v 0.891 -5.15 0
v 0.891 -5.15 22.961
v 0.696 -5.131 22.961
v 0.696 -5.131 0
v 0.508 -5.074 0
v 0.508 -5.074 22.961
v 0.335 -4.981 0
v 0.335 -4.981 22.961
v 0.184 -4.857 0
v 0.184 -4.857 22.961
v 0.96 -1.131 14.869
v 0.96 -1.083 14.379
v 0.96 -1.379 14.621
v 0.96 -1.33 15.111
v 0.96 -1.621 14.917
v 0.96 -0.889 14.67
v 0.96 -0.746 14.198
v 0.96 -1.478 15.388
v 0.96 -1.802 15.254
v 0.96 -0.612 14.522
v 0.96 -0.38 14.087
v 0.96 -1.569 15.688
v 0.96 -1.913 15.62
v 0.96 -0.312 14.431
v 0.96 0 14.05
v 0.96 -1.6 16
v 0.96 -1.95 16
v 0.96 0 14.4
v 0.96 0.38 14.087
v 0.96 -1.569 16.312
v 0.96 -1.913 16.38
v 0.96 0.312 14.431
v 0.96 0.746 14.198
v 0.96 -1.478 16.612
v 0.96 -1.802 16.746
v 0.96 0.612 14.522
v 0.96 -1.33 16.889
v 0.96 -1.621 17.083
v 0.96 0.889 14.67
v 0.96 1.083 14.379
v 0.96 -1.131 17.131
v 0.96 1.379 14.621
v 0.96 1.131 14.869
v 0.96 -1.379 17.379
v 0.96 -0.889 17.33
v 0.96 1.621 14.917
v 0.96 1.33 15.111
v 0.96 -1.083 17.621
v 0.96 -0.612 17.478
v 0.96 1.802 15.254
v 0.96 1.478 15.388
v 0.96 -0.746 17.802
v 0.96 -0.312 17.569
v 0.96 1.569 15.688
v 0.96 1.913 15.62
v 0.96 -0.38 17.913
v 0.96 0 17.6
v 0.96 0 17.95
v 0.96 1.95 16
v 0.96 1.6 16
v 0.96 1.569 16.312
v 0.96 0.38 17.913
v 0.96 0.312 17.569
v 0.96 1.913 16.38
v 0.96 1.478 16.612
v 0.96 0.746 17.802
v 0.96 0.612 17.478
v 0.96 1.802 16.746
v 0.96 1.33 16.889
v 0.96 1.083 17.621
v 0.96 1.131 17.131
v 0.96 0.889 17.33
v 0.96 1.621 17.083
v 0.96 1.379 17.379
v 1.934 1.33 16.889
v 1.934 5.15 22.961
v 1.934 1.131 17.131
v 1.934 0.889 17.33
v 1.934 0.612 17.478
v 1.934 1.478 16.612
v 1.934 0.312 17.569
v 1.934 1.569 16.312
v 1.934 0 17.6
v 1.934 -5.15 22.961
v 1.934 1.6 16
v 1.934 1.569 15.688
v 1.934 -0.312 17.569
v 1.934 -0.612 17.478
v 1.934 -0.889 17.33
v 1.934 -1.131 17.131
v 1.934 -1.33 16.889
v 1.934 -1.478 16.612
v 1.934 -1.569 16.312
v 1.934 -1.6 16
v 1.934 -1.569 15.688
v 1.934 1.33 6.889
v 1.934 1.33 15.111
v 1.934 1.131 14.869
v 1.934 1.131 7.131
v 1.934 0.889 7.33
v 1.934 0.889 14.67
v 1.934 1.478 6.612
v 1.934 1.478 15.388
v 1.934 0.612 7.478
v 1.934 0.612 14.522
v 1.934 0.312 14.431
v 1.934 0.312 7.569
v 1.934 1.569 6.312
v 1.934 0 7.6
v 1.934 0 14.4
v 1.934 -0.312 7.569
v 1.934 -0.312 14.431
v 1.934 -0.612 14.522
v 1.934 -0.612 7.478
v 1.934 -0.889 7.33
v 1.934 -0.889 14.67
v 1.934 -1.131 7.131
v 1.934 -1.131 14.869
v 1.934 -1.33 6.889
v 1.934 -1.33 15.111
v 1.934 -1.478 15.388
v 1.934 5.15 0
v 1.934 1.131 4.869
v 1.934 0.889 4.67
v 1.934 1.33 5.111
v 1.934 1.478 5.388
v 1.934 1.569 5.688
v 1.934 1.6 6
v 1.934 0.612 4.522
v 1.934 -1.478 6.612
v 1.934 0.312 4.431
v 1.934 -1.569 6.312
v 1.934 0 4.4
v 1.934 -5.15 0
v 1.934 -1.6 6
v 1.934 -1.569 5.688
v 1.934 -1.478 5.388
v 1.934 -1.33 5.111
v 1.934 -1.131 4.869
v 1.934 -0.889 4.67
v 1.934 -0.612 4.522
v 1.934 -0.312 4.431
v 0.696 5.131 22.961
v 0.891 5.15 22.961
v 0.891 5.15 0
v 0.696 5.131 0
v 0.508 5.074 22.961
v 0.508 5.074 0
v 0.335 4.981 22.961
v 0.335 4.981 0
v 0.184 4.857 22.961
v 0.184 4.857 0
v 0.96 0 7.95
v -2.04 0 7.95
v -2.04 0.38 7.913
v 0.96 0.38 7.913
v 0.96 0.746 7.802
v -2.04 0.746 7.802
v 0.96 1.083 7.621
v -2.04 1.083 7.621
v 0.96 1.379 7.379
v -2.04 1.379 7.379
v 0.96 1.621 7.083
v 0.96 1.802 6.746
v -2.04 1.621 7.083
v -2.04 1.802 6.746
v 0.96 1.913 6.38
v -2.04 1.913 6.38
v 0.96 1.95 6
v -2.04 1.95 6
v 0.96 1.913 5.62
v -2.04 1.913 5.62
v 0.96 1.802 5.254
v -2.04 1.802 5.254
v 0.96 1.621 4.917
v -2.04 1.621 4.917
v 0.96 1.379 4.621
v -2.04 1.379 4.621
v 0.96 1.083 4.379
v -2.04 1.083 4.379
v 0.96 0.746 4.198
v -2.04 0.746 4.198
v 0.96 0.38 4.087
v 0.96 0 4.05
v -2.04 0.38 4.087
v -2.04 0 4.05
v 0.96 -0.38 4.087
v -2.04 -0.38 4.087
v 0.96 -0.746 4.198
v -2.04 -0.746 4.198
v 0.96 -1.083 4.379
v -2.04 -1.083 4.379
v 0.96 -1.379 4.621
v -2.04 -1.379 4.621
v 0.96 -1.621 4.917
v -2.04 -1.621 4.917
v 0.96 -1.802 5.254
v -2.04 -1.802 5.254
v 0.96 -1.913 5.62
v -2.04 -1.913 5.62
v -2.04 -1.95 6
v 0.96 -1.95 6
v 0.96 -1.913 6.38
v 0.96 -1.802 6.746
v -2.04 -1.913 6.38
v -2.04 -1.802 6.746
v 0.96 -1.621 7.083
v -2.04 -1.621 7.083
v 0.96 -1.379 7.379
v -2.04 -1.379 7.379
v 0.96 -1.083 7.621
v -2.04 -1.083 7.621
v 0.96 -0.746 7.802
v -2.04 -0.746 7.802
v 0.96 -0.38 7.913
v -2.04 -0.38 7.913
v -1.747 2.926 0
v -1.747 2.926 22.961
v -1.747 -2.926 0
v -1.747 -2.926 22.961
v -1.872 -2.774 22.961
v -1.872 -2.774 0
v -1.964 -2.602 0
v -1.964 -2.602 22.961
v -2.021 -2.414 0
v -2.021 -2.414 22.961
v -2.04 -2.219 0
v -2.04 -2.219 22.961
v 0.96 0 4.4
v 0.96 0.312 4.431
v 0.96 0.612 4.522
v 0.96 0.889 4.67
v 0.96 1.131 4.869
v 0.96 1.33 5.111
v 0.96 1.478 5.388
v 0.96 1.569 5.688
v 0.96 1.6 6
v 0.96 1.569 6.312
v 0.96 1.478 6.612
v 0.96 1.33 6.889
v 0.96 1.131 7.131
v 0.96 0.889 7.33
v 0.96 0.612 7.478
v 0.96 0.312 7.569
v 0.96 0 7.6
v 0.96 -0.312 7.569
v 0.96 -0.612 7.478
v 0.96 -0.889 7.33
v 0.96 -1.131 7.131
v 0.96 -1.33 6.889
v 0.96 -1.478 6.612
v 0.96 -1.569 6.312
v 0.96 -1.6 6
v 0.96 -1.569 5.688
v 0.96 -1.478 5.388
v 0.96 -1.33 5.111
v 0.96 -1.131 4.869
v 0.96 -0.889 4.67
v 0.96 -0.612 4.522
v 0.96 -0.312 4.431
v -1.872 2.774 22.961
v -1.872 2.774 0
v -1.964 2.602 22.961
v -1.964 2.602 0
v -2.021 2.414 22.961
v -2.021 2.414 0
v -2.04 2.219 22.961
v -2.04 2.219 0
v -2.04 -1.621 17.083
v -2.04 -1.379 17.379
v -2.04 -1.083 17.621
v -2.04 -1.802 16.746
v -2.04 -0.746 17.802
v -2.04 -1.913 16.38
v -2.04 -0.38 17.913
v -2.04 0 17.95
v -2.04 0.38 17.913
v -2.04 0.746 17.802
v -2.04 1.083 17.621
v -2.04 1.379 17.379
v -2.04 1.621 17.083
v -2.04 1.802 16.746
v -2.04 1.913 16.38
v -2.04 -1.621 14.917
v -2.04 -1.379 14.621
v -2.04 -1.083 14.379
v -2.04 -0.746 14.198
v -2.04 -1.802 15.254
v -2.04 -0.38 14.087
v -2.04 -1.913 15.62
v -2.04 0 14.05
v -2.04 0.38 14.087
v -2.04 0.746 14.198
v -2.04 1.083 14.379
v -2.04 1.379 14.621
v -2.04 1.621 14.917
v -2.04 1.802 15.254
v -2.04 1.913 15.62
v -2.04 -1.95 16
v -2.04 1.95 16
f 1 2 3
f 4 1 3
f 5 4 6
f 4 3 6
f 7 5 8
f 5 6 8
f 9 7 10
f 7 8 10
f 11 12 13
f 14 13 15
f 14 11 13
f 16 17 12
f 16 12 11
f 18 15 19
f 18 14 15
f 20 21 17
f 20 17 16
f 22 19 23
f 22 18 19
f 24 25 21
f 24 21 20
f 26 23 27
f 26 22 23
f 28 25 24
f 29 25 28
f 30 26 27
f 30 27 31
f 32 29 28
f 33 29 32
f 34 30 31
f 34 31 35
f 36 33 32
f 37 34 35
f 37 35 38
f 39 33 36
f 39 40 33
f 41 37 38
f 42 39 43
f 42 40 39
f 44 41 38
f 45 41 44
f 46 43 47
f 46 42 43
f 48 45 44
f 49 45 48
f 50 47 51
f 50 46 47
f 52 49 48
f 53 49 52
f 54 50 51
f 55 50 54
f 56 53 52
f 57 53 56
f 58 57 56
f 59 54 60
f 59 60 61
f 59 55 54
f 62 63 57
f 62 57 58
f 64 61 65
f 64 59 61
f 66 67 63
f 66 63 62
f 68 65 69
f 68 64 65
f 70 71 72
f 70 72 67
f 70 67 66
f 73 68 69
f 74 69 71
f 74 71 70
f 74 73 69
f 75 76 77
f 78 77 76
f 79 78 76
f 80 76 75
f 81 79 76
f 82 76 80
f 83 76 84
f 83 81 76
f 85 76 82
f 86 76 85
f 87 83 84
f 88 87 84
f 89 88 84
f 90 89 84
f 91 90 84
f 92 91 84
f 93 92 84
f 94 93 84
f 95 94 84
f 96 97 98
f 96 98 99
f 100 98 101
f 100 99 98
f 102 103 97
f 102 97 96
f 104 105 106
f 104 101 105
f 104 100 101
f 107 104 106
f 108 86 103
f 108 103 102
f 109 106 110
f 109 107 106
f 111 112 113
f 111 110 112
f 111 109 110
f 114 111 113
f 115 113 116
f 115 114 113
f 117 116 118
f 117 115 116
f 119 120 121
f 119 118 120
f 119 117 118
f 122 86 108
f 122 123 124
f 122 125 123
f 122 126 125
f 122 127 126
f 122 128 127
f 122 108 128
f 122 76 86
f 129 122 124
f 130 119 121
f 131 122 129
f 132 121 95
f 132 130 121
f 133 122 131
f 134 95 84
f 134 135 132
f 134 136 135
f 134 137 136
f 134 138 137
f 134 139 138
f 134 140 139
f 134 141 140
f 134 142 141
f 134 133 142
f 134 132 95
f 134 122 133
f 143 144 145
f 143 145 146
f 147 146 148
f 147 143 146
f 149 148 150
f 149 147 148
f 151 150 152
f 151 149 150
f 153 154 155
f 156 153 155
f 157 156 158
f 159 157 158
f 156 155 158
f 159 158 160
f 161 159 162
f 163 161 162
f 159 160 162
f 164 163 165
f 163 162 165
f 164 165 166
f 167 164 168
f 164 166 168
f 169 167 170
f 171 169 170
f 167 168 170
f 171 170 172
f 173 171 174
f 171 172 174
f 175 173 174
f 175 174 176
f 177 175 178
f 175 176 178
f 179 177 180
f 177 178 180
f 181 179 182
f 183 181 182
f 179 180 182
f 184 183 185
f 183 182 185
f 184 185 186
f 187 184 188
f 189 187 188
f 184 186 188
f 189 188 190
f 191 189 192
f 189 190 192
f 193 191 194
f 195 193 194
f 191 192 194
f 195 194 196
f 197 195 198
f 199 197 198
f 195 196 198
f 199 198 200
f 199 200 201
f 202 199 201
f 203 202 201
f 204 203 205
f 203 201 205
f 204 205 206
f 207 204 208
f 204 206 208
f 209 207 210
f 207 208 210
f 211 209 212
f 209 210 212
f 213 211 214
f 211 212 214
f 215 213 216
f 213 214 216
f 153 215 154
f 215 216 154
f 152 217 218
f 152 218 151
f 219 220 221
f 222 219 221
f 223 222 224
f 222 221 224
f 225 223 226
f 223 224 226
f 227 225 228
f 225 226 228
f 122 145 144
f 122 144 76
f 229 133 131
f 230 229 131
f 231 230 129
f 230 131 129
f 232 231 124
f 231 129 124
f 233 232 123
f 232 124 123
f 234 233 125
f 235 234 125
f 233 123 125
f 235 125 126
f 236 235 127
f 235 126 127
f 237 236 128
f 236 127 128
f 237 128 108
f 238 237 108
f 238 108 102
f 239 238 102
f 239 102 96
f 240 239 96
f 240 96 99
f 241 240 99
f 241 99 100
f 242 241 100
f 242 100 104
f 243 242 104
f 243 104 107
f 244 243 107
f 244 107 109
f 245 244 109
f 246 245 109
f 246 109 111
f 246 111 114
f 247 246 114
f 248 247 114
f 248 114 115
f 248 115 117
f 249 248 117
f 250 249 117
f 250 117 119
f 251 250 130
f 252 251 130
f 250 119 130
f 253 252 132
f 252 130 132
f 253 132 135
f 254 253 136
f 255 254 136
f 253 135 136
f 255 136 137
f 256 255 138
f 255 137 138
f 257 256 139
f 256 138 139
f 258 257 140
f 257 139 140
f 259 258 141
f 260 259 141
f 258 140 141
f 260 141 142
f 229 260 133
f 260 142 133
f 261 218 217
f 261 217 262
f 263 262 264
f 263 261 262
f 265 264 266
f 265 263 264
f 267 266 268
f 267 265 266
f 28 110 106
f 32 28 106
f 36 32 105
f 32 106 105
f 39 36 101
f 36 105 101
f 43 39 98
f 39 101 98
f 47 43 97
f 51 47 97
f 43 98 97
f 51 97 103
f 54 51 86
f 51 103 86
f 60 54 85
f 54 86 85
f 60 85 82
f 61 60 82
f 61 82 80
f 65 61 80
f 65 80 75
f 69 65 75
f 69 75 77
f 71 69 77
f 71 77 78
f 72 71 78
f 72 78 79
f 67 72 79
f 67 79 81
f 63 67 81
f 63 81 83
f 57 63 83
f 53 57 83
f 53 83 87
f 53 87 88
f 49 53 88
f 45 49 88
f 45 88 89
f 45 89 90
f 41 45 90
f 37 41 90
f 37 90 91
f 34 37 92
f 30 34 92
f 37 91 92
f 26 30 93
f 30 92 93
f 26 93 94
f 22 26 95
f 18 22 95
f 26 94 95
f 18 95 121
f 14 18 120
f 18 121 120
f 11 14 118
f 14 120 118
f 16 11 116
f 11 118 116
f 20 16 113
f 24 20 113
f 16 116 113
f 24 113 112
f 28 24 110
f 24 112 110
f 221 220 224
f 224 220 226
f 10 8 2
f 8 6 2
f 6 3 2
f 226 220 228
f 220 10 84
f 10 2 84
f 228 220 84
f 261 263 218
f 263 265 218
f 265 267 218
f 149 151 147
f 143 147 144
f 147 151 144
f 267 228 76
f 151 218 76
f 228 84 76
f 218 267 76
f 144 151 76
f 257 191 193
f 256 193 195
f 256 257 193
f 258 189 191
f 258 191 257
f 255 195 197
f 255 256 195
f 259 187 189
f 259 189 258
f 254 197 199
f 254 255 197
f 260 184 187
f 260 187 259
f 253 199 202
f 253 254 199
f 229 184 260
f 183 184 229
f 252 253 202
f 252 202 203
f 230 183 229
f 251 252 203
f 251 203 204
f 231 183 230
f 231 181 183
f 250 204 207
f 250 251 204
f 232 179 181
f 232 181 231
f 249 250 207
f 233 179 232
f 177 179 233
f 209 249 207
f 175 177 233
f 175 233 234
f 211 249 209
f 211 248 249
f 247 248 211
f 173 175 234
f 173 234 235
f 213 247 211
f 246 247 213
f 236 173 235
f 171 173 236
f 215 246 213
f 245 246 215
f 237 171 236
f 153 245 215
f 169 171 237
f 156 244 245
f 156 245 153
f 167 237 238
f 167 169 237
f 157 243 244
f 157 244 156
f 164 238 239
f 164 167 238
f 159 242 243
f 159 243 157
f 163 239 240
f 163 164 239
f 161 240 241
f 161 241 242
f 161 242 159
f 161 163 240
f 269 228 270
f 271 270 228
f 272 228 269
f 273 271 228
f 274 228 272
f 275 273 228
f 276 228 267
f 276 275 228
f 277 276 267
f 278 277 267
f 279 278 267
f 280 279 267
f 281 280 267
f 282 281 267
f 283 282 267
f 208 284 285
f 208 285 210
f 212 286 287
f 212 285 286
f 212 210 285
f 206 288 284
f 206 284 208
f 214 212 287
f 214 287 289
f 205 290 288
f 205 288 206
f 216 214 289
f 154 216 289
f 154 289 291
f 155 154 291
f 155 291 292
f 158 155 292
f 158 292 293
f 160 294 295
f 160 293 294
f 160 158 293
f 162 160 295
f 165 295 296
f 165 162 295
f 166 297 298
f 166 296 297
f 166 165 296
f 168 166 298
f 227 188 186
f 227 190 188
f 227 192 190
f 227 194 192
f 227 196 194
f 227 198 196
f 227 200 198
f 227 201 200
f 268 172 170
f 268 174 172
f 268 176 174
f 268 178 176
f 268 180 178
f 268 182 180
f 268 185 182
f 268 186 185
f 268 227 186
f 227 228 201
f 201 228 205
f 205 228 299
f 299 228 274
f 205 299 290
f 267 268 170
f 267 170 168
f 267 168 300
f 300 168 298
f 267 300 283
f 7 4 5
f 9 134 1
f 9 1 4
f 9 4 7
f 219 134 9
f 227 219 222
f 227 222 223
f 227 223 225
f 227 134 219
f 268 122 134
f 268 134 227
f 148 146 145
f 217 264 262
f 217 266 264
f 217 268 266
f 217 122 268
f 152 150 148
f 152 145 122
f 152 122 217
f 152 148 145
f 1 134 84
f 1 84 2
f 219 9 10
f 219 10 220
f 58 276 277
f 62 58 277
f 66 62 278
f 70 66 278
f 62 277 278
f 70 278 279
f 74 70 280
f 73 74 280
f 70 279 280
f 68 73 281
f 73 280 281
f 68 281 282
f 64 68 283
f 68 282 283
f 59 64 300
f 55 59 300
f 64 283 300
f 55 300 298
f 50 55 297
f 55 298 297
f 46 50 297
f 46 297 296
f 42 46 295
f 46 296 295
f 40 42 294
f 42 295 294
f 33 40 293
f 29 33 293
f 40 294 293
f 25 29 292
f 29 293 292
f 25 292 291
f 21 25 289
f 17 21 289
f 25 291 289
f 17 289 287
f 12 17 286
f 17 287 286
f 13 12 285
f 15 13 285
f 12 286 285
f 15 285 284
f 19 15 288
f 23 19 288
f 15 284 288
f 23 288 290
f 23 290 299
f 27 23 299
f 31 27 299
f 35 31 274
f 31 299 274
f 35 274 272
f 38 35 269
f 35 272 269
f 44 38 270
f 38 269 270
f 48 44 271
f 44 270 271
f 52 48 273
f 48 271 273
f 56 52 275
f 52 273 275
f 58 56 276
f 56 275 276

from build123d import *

# Parameters (mm, degrees)
BOSS_EXTRUDE1_DEPTH = 36
SKETCH2_R           = 1.6
CUT_EXTRUDE1_DEPTH  = 10
SKETCH3_R           = 1.95
CUT_EXTRUDE2_DEPTH  = 3
FILLET1_R           = 1
SKETCH4_W           = 8
SKETCH4_H           = 10.3
CUT_EXTRUDE3_DEPTH  = 10
SKETCH5_W           = 5.039372534
SKETCH5_H           = 10.3
CUT_EXTRUDE4_DEPTH  = 10


with BuildPart() as part:
    # Sketch1 → Boss-Extrude1 (new body)
    with BuildSketch(Plane.XY):
        Polygon((1.933806537, 5.15), (1.933806537, -5.15), (0.476512405, -5.15), (-2.040358106, -2.633129489), (-2.040358106, 2.633129489), (0.476512405, 5.15), align=None)
    extrude(amount=BOSS_EXTRUDE1_DEPTH)

    # Sketch2 → Cut-Extrude1 (cut)
    with BuildSketch(Plane(origin=(1.933806537, 0, 0), x_dir=(0, 0, -1), z_dir=(1, 0, 0))):
        with Locations((-16, 0)):
            Circle(SKETCH2_R)
        with Locations((-31, 0)):
            Circle(SKETCH2_R)
        with Locations((-6, 0)):
            Circle(SKETCH2_R)
    extrude(amount=-CUT_EXTRUDE1_DEPTH, mode=Mode.SUBTRACT)

    # Sketch3 → Cut-Extrude2 (cut)
    with BuildSketch(Plane.ZY.offset(2.040358106)):
        with Locations((16, 0)):
            Circle(SKETCH3_R)
        with Locations((31, 0)):
            Circle(SKETCH3_R)
        with Locations((6, 0)):
            Circle(SKETCH3_R)
    extrude(amount=-CUT_EXTRUDE2_DEPTH, mode=Mode.SUBTRACT)

    # Fillet1
    fillet1_edges = [part.edges().sort_by_distance(p)[0] for p in [
        (0.476512405, 5.15, 18),
        (0.476512405, -5.15, 18),
        (-2.040358106, 2.633129489, 18),
        (-2.040358106, -2.633129489, 18),
    ]]
    fillet(fillet1_edges, radius=FILLET1_R)

    # Sketch4 → Cut-Extrude3 (cut)
    with BuildSketch(Plane(origin=(1.933806537, 0, 0), x_dir=(0, 0, -1), z_dir=(1, 0, 0))):
        with Locations((-32, 0)):
            Rectangle(SKETCH4_W, SKETCH4_H)
    extrude(amount=-CUT_EXTRUDE3_DEPTH, mode=Mode.SUBTRACT)

    # Sketch5 → Cut-Extrude4 (cut)
    with BuildSketch(Plane(origin=(1.933806537, 0, 0), x_dir=(0, 0, -1), z_dir=(1, 0, 0))):
        with Locations((-25.480313733, 0)):
            Rectangle(SKETCH5_W, SKETCH5_H)
    extrude(amount=-CUT_EXTRUDE4_DEPTH, mode=Mode.SUBTRACT)


solid = part.part
